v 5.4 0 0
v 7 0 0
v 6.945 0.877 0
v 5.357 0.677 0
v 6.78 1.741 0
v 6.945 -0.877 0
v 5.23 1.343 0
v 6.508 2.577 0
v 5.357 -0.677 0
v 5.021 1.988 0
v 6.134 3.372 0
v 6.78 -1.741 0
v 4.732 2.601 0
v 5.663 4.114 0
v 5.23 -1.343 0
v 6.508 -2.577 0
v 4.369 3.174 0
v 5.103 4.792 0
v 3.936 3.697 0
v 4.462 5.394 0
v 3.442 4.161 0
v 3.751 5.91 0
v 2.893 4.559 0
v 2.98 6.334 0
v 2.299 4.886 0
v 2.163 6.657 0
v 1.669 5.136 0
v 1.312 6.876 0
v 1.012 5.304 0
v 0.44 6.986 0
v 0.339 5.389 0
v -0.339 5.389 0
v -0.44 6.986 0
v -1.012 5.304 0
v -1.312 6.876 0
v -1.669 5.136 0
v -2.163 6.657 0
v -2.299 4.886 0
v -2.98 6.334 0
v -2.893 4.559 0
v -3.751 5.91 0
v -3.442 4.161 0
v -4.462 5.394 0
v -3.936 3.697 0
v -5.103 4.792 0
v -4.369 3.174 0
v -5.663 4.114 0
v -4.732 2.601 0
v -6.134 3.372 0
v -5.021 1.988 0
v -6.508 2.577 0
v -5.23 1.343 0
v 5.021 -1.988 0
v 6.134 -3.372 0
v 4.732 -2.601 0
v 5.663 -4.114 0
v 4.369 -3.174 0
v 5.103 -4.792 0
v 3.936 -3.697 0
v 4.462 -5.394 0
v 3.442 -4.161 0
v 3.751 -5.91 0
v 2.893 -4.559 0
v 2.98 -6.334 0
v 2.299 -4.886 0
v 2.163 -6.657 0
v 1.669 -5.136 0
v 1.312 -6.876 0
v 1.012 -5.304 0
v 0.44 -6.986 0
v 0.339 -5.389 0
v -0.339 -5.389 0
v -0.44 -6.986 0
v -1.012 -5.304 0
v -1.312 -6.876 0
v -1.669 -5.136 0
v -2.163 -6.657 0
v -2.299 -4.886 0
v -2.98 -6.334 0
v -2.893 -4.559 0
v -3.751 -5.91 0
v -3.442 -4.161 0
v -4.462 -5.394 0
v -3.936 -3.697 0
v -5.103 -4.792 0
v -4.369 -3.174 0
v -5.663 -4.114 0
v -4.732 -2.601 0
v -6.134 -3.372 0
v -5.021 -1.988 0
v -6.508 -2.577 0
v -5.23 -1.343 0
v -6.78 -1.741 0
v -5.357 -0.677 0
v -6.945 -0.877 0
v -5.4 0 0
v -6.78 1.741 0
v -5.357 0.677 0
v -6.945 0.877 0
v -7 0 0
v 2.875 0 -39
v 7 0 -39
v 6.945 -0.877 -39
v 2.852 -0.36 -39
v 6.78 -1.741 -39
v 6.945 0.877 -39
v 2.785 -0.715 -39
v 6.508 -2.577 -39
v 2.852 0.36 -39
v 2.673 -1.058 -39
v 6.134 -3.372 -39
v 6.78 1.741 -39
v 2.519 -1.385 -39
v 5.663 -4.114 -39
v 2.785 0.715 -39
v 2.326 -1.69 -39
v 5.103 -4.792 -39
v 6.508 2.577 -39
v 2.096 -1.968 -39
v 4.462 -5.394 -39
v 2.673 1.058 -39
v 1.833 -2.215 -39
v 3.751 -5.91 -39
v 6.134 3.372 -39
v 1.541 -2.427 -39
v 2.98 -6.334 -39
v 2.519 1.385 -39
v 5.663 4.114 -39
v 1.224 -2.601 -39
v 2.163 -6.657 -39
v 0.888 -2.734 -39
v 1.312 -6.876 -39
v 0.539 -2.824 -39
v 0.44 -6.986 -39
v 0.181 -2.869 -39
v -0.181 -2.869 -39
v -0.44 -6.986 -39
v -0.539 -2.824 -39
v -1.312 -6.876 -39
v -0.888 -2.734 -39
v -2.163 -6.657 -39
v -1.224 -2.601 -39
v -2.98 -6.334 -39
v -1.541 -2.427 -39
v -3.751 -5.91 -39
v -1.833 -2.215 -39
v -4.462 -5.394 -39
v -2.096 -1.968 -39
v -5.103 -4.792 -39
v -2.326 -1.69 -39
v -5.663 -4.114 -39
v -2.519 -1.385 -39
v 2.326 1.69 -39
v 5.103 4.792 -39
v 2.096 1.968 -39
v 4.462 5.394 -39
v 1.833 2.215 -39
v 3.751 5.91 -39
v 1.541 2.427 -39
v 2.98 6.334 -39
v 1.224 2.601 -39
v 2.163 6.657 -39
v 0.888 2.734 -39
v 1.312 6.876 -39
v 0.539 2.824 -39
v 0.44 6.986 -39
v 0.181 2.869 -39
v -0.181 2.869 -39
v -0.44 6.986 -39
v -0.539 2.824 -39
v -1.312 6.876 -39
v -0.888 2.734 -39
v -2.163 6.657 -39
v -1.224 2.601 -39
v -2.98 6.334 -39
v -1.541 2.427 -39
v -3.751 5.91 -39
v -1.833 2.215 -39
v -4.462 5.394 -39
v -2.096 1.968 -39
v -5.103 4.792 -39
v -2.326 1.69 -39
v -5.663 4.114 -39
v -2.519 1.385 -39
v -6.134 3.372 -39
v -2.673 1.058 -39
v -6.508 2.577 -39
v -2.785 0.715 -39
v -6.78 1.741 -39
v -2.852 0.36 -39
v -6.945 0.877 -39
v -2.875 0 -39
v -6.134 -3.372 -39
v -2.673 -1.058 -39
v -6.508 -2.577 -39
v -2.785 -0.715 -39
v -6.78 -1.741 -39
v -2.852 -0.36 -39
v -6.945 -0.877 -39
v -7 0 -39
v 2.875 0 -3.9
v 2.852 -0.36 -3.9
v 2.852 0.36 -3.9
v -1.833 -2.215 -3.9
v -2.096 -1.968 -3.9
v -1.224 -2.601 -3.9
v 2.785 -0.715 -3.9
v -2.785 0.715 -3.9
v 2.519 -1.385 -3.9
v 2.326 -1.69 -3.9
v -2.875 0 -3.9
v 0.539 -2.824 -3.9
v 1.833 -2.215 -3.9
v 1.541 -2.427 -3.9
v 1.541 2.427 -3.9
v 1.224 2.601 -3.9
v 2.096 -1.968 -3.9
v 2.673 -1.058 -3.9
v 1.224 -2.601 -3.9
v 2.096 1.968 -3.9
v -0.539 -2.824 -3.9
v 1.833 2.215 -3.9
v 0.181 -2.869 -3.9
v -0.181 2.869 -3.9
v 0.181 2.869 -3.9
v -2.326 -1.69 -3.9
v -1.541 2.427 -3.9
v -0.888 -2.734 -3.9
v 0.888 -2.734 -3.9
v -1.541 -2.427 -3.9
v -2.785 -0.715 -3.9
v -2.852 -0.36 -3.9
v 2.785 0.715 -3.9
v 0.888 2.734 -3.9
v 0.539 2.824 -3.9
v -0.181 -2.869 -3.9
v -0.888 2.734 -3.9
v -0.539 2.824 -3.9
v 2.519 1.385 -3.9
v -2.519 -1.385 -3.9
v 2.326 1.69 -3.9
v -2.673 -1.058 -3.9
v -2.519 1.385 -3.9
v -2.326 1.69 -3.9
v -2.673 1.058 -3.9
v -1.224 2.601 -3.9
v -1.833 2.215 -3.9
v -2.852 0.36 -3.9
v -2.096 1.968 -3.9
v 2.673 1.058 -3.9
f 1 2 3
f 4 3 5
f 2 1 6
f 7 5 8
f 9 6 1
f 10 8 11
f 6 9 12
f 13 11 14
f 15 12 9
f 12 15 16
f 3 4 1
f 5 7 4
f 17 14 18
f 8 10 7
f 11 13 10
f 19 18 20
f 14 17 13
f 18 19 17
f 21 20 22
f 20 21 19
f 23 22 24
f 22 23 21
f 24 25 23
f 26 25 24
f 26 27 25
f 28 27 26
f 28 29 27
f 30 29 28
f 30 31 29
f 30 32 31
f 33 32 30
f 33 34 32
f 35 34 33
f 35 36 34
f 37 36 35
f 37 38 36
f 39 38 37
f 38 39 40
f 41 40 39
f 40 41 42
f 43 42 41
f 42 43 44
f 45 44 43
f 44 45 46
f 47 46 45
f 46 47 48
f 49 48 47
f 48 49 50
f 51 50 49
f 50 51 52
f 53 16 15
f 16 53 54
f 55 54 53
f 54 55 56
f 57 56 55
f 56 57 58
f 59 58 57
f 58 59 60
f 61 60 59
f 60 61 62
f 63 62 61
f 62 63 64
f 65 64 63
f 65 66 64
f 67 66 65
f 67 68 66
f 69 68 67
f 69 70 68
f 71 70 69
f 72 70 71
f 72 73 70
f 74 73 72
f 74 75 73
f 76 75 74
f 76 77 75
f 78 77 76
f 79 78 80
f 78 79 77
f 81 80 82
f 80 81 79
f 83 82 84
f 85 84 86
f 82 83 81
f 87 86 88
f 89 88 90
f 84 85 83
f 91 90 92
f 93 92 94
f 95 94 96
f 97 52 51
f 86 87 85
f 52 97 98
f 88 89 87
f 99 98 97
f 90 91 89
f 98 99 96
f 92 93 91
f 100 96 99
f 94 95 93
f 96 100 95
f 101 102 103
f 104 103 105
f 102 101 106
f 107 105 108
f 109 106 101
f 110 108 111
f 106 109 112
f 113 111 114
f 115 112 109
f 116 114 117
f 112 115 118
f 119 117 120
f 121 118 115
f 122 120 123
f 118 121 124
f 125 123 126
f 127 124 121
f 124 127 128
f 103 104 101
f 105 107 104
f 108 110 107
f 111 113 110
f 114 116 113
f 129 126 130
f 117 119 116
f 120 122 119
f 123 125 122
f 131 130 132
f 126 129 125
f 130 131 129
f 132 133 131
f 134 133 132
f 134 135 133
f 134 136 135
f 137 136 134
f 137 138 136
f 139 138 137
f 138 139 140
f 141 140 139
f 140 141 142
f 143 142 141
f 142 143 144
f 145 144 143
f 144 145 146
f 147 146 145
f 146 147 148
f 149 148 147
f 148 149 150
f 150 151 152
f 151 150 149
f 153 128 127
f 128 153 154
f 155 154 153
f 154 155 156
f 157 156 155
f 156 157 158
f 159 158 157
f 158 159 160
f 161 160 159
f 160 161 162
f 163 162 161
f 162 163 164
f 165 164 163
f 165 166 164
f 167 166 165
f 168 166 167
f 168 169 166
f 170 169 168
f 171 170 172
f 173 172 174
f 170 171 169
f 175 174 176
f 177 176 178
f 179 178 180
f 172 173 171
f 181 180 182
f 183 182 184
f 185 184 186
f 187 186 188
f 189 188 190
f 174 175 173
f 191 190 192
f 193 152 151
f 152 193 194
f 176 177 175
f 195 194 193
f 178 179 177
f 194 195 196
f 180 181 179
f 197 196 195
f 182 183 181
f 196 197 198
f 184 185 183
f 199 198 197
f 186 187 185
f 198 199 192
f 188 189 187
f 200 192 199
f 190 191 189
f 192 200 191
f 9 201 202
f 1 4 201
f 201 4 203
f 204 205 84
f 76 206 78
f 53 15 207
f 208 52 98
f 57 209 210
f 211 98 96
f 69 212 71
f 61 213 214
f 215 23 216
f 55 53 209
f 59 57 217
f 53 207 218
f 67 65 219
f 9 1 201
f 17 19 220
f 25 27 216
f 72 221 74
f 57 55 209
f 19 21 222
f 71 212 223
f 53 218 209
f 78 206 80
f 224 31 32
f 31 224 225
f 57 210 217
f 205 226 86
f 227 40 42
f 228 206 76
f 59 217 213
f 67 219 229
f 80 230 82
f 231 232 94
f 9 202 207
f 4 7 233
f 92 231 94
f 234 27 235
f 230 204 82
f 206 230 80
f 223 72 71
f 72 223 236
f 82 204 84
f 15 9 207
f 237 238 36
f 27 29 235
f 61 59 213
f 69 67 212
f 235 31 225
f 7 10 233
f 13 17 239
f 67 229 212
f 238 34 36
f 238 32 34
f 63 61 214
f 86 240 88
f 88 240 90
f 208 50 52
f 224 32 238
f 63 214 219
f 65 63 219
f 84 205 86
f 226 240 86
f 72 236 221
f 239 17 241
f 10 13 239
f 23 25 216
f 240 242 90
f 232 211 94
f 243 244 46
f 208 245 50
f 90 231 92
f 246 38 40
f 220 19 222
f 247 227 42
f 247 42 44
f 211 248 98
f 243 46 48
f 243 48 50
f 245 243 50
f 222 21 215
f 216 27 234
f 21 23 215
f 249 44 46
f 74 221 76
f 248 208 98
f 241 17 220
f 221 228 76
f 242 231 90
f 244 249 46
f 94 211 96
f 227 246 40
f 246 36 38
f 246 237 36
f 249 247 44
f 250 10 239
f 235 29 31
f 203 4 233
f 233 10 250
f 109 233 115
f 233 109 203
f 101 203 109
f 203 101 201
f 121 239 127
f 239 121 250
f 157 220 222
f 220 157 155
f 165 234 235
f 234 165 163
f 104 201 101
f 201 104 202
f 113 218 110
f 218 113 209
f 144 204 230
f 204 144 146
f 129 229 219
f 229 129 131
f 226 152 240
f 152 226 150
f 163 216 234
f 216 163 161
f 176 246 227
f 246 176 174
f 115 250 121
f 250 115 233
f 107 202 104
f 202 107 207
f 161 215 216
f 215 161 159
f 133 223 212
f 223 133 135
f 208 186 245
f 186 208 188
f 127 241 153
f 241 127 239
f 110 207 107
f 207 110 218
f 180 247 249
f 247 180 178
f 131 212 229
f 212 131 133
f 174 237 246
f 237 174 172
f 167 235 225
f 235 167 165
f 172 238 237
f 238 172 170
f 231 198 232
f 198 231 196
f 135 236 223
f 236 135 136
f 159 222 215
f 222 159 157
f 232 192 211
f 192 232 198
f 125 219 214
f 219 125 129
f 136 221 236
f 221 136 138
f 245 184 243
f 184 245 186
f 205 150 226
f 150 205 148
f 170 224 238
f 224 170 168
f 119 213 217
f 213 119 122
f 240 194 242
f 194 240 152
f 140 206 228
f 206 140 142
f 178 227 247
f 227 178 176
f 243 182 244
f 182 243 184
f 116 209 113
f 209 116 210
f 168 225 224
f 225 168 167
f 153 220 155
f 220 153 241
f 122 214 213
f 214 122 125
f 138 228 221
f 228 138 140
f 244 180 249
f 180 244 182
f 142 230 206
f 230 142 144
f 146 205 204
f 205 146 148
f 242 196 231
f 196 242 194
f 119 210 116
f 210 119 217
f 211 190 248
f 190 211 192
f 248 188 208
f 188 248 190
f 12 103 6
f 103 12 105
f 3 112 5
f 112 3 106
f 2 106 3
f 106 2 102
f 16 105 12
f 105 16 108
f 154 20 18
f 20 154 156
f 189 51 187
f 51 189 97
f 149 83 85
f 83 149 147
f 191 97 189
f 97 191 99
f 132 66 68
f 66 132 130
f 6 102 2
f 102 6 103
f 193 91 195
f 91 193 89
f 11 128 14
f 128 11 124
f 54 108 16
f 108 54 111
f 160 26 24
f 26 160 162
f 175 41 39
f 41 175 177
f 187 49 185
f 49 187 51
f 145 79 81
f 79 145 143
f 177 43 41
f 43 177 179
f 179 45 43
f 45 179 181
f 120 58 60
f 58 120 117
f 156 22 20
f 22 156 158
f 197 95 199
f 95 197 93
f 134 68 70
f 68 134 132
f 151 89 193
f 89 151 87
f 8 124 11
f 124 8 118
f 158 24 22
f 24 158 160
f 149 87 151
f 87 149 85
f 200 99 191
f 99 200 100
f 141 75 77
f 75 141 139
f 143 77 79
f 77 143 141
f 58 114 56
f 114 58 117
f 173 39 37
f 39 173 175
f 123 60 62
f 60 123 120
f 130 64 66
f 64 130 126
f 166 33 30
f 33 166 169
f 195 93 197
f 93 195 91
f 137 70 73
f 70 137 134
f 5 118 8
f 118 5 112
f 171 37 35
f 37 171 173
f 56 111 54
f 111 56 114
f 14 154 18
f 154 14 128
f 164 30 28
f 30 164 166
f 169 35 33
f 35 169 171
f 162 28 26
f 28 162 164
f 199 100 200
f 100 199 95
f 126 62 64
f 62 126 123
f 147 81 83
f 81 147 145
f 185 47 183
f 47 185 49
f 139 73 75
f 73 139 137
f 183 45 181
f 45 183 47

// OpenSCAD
$fn = 50;


difference() {
	union() {
		translate(v = [0, 0, -39.0000000000]) {
			cylinder(h = 39, r = 7.0000000000);
		}
		cylinder(h = 0, r = 13.0000000000);
	}
	union() {
		translate(v = [0, 0, 0]) {
			rotate(a = [0, 0, 0]) {
				difference() {
					union() {
						#translate(v = [0, 0, -39.0000000000]) {
							cylinder(h = 39, r = 2.6000000000);
						}
						#translate(v = [0, 0, -3.9000000000]) {
							cylinder(h = 3.9000000000, r1 = 2.8750000000, r2 = 5.4000000000);
						}
						#translate(v = [0, 0, -39.0000000000]) {
							cylinder(h = 39, r = 2.8750000000);
						}
						#translate(v = [0, 0, -39.0000000000]) {
							cylinder(h = 39, r = 2.6000000000);
						}
					}
					union();
				}
			}
		}
	}
}
